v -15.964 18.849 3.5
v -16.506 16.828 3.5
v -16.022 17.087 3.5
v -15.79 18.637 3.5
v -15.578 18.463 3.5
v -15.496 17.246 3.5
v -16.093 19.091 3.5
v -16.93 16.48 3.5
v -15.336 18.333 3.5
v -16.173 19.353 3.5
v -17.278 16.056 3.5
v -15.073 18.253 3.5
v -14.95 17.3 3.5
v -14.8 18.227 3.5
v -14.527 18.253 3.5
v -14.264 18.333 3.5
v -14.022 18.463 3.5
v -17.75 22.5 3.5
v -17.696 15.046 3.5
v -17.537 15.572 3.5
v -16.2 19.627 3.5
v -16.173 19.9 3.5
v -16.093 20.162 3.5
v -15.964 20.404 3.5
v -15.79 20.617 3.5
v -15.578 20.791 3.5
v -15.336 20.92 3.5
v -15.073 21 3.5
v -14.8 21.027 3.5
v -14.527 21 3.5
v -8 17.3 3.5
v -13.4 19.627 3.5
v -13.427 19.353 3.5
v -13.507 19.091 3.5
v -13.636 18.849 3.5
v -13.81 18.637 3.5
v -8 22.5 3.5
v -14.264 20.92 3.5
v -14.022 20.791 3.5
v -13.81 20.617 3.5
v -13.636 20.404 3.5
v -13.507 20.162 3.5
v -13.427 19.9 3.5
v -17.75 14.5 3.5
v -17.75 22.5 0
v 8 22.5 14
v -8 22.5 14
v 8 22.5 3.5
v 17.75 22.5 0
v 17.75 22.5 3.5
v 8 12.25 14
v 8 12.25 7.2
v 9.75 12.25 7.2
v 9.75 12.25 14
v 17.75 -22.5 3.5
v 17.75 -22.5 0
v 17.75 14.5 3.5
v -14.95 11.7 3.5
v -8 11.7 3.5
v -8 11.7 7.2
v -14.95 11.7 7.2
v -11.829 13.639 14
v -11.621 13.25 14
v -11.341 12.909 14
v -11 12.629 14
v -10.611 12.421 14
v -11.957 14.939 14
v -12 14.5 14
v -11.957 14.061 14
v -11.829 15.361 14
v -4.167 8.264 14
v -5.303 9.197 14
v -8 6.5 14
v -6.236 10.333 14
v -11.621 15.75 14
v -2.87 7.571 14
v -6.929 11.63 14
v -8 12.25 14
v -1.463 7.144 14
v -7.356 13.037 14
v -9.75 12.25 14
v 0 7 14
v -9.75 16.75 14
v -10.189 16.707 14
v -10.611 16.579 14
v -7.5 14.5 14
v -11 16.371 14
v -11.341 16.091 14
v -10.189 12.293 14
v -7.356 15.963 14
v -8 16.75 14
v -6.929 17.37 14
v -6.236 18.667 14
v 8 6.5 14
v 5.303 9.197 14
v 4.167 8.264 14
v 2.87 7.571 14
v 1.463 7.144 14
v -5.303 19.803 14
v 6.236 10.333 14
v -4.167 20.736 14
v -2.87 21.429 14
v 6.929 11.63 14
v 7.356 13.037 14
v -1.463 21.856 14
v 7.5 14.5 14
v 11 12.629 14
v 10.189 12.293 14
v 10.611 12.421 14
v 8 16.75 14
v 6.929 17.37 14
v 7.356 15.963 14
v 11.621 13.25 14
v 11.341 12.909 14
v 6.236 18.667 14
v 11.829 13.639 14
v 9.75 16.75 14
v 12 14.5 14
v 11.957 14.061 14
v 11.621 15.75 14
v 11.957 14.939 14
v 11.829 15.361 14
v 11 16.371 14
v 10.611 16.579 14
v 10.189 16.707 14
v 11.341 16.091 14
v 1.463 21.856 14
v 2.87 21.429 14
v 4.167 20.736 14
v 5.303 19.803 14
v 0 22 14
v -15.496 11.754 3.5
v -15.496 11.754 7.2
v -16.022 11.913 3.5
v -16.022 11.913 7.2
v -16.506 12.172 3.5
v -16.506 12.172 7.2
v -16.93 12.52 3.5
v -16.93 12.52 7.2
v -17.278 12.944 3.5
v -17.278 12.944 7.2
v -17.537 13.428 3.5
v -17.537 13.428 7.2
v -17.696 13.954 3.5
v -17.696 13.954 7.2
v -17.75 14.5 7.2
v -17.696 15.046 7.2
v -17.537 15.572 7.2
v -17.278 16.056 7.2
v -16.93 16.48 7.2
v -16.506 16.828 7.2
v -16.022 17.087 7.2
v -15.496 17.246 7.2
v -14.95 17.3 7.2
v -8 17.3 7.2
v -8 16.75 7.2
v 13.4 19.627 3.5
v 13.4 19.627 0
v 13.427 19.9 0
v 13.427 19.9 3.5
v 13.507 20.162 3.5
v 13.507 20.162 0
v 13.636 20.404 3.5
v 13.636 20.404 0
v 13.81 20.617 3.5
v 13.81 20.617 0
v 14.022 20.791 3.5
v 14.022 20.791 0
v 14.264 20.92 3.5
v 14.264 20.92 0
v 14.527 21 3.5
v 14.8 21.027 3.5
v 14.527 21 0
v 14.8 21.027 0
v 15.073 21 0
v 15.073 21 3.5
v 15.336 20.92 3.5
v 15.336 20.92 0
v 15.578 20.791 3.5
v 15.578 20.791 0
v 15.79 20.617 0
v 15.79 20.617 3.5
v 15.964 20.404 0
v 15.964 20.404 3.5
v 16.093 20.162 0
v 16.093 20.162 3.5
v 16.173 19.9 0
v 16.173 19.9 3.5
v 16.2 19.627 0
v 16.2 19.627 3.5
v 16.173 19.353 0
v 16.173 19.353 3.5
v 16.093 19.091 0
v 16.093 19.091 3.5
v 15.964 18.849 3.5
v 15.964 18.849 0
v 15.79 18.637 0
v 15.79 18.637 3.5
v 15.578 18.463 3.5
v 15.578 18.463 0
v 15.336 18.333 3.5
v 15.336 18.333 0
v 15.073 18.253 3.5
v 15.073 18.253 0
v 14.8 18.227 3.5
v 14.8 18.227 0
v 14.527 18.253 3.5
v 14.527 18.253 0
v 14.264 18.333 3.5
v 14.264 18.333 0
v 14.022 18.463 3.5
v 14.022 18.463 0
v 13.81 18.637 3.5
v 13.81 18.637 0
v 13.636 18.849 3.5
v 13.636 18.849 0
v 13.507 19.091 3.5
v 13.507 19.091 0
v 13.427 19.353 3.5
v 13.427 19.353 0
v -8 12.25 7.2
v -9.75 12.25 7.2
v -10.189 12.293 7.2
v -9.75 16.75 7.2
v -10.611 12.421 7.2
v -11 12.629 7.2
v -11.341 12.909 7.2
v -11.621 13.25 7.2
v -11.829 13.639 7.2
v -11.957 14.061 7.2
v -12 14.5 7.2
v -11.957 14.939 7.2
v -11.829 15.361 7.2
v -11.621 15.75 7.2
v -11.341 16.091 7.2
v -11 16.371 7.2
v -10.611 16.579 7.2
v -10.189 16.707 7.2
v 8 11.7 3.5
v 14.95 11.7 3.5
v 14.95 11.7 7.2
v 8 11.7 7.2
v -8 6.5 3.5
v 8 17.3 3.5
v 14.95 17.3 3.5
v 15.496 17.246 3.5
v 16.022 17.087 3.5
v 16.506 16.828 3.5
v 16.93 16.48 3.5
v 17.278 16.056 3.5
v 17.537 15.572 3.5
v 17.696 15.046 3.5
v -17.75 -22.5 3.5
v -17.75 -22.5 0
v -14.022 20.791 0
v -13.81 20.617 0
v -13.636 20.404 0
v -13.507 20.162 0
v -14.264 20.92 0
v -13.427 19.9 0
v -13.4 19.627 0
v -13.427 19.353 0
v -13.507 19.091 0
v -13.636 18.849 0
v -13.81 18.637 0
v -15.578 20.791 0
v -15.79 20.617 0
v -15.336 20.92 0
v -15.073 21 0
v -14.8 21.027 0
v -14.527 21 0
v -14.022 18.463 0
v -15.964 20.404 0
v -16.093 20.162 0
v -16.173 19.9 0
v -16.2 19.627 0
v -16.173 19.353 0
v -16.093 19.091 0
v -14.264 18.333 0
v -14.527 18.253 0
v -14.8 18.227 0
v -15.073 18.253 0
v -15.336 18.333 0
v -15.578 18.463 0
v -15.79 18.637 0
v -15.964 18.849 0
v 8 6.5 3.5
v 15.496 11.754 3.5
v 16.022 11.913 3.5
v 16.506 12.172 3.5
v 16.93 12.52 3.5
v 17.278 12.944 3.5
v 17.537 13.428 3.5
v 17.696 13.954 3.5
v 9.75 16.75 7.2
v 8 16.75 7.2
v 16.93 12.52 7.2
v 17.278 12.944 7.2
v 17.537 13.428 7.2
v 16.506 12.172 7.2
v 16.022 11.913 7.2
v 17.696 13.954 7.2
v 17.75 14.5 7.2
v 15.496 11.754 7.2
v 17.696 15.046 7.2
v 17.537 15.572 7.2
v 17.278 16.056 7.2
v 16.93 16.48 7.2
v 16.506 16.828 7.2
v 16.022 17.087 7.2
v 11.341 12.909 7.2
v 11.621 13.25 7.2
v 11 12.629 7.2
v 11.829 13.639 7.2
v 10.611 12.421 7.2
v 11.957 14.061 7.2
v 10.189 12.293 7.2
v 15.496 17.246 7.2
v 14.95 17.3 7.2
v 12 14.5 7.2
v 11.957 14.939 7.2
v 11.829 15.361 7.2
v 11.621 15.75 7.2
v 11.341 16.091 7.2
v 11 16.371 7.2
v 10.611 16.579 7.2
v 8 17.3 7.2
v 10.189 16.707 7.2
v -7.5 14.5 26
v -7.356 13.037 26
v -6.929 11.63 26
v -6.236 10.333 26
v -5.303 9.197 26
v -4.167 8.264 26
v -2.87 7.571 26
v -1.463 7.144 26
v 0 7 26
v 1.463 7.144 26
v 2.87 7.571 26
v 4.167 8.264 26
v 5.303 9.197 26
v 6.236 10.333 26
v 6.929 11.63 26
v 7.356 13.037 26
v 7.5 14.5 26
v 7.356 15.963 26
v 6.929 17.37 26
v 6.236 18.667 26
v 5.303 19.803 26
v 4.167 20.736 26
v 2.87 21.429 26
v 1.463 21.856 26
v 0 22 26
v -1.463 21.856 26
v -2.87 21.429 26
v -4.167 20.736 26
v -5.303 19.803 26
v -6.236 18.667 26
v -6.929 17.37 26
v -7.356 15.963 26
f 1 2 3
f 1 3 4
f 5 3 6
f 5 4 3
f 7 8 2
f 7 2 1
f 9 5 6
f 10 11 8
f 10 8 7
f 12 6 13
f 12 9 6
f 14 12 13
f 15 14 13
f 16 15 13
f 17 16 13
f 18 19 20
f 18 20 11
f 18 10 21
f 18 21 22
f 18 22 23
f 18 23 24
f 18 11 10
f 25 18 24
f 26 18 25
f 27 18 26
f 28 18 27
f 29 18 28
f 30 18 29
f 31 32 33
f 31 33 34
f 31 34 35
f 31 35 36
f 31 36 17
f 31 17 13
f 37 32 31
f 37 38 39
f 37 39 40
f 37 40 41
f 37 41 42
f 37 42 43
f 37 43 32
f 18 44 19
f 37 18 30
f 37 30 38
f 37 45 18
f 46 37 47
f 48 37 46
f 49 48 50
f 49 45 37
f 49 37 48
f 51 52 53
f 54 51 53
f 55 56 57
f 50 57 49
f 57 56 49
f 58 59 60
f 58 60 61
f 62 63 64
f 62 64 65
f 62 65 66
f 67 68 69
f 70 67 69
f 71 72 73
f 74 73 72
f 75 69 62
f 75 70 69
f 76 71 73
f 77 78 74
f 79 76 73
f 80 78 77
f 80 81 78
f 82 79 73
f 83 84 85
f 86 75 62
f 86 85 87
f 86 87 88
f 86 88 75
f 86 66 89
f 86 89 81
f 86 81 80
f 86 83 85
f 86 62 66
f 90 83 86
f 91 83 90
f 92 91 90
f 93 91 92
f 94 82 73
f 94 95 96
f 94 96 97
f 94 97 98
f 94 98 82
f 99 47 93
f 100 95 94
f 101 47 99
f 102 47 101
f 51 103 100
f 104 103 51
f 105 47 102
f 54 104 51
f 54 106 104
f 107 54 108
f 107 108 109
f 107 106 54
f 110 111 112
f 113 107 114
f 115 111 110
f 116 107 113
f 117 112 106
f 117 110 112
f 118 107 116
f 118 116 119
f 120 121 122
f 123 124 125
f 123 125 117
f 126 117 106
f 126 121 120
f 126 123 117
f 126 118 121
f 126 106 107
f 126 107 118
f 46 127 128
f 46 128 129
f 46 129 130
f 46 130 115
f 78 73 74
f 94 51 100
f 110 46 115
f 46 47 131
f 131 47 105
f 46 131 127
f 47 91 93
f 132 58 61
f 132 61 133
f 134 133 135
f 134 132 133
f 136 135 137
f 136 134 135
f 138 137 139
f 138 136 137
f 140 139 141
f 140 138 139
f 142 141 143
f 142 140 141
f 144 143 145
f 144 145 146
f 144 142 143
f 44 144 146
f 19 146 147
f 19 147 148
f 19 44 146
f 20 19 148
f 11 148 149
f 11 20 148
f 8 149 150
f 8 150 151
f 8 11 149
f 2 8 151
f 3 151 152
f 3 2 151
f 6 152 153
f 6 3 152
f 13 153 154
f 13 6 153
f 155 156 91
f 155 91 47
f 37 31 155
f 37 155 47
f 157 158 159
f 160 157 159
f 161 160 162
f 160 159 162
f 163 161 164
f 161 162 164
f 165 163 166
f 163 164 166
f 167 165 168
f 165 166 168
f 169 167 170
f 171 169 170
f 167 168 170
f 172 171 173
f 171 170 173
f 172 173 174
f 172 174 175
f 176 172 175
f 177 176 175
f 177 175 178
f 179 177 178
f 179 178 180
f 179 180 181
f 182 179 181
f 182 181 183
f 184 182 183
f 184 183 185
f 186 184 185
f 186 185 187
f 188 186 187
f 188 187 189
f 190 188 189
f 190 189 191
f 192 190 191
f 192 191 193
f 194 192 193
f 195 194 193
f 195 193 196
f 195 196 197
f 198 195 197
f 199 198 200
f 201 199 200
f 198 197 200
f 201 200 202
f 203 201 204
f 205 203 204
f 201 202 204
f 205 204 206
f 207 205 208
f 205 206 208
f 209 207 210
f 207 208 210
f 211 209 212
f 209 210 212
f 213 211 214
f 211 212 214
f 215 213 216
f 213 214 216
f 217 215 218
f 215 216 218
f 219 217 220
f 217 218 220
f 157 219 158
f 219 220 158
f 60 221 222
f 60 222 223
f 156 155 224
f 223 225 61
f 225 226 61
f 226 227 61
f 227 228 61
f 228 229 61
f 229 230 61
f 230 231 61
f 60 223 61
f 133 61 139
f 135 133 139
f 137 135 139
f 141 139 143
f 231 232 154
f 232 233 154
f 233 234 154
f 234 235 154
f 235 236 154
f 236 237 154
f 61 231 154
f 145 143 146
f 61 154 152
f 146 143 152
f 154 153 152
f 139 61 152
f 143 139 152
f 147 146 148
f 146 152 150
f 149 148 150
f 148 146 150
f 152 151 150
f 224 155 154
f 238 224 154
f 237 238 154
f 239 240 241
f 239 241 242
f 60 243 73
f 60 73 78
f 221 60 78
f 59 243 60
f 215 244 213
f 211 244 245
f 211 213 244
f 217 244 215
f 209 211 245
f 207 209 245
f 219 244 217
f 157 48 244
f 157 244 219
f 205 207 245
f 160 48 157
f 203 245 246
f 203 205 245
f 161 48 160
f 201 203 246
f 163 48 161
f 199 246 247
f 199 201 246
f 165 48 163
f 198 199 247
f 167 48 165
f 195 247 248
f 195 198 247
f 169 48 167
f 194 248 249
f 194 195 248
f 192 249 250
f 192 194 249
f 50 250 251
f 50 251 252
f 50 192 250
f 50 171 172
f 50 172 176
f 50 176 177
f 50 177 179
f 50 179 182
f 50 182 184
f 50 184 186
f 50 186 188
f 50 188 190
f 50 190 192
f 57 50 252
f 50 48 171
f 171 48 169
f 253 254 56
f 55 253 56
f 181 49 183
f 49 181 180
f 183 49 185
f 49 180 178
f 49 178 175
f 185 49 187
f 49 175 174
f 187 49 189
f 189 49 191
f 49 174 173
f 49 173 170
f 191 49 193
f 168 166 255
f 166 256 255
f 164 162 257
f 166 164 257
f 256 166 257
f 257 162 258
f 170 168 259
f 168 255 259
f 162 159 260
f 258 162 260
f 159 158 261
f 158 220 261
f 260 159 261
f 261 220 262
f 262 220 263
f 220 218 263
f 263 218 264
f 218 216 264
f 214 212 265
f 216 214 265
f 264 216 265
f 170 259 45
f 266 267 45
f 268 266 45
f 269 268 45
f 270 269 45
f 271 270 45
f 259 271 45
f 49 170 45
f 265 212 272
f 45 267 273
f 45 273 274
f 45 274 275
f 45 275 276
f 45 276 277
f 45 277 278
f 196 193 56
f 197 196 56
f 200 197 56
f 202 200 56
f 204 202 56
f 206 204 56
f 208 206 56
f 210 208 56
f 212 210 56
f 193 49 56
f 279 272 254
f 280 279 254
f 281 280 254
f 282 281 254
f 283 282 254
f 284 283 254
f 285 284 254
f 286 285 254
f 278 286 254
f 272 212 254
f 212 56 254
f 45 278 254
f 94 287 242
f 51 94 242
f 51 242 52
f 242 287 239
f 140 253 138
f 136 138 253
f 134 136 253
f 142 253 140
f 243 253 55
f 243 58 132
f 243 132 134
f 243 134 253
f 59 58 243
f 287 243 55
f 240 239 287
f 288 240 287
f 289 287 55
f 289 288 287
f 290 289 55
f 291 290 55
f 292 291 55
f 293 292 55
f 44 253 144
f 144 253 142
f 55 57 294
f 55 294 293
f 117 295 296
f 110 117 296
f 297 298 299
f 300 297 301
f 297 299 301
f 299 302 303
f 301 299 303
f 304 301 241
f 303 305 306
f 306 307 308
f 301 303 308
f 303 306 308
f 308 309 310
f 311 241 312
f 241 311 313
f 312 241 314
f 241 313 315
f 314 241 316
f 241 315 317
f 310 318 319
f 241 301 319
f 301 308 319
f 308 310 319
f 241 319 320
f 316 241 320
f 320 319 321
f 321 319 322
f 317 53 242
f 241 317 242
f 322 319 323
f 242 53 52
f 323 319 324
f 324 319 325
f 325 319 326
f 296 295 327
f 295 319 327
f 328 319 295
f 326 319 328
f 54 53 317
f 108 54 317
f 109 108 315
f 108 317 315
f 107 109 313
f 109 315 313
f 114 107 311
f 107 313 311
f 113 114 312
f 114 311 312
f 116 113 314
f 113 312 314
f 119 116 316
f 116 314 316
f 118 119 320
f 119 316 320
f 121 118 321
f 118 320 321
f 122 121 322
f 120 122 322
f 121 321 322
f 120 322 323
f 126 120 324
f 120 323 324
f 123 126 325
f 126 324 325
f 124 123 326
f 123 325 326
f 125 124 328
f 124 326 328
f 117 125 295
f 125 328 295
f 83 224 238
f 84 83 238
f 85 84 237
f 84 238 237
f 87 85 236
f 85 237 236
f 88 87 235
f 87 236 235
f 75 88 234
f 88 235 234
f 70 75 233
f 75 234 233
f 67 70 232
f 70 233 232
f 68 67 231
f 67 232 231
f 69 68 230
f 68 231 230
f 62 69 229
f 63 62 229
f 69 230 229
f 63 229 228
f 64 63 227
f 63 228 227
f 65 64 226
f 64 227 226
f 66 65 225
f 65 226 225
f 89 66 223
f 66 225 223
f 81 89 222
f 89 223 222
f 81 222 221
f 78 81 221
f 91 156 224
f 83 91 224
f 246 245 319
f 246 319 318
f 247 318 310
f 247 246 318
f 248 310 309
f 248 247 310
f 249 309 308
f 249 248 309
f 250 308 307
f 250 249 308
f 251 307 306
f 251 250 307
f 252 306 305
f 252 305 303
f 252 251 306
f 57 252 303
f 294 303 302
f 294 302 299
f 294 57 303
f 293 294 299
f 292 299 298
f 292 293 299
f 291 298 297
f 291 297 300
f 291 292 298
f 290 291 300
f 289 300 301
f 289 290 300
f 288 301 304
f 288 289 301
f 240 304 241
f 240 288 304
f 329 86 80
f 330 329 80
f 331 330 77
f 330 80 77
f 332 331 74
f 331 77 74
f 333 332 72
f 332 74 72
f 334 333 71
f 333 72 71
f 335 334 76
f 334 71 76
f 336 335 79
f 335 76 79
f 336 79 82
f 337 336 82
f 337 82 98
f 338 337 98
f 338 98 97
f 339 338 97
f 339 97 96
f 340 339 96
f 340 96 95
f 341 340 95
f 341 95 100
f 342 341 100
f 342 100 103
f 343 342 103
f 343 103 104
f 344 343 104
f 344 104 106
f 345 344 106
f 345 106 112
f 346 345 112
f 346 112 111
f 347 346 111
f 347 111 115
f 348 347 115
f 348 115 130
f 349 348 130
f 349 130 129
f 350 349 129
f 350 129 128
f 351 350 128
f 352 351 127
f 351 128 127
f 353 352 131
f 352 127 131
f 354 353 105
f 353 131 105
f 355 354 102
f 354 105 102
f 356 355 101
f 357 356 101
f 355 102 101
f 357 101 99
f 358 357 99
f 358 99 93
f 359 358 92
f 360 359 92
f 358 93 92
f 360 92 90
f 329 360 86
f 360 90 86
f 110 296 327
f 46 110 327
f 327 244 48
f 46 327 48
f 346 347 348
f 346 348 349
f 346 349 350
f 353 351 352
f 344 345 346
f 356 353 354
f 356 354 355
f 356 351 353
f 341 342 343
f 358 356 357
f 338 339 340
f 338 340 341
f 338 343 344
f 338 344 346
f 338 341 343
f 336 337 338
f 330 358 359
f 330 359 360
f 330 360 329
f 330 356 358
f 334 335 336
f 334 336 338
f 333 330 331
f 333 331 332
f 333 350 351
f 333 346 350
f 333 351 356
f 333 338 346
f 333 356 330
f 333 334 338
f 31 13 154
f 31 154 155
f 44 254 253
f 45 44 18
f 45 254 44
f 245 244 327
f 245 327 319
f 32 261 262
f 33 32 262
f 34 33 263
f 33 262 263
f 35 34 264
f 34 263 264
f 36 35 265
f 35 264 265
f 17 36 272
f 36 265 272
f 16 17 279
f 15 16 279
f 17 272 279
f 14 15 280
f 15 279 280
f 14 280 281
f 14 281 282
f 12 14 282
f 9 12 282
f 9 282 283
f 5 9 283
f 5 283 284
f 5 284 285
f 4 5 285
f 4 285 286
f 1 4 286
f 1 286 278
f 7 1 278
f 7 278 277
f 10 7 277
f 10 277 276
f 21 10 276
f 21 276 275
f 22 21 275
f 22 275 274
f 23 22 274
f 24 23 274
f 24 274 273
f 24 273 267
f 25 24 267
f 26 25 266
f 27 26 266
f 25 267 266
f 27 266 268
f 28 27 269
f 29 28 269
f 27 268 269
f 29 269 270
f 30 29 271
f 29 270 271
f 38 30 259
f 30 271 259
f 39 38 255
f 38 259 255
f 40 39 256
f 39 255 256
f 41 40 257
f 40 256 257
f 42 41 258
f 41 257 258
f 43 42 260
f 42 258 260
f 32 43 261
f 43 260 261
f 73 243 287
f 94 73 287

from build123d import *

# Parameters (mm, degrees)
SKETCH_4_W          = 35.5
SKETCH_4_H          = 45
EXTRUDE_2_DEPTH     = 3.5
EXTRUDE_START       = -3.5
SKETCH_5_W          = 16
SKETCH_5_H          = 4.5
SKETCH_5_H_2        = 5.75
EXTRUDE_3_DEPTH     = 14
EXTRUDE_4_DEPTH     = 7.2
EXTRUDE_START_2     = -14
SKETCH_7_R          = 7.5
EXTRUDE_5_DEPTH     = 26
CUT_EXTRUDE_1_REACH = 40.695
SKETCH_8_R          = 1.4


with BuildPart() as part:
    # 草图4 → 凸台-拉伸2 (new body)
    with BuildSketch(Plane.XY):
        Rectangle(SKETCH_4_W, SKETCH_4_H)
    extrude(amount=EXTRUDE_2_DEPTH)

    # 草图5 → 凸台-拉伸3 (add)
    with BuildSketch(Plane.XY.offset(3.5).offset(EXTRUDE_START)):
        with BuildLine():
            Line((-8, 12.25), (-8, 16.75))
            Line((-8, 16.75), (-9.75, 16.75))
            ThreePointArc((-9.75, 16.75), (-12, 14.5), (-9.75, 12.25))
            Line((-9.75, 12.25), (-8, 12.25))
        make_face()
        with Locations((0, 14.5)):
            Rectangle(SKETCH_5_W, SKETCH_5_H)
        with Locations((0, 19.625)):
            Rectangle(SKETCH_5_W, SKETCH_5_H_2)
        with BuildLine():
            Line((9.75, 16.75), (8, 16.75))
            Line((8, 16.75), (8, 12.25))
            Line((8, 12.25), (9.75, 12.25))
            ThreePointArc((9.75, 12.25), (12, 14.5), (9.75, 16.75))
        make_face()
        with Locations((0, 9.375)):
            Rectangle(SKETCH_5_W, SKETCH_5_H_2)
    extrude(amount=EXTRUDE_3_DEPTH)

    # 草图6 → 凸台-拉伸4 (add)
    with BuildSketch(Plane.XY.offset(3.5).offset(EXTRUDE_START)):
        with BuildLine():
            Line((-14.95, 17.3), (14.95, 17.3))
            ThreePointArc((14.95, 17.3), (17.75, 14.5), (14.95, 11.7))
            Line((14.95, 11.7), (-14.95, 11.7))
            ThreePointArc((-14.95, 11.7), (-17.75, 14.5), (-14.95, 17.3))
        make_face()
    extrude(amount=EXTRUDE_4_DEPTH)

    # 草图7 → 凸台-拉伸5 (add)
    with BuildSketch(Plane.XY.offset(14).offset(EXTRUDE_START_2)):
        with Locations(Location((0, 14.5, 0), (0, 0, 180))):
            Circle(SKETCH_7_R)
    extrude(amount=EXTRUDE_5_DEPTH)

    # 草图8 → 切除-拉伸1 (cut, up to next)
    with BuildSketch(Plane(origin=(0, 0, 0), x_dir=(-1, 0, 0), z_dir=(0, 0, -1)), mode=Mode.PRIVATE) as cut_extrude_1_sk1:
        with Locations((-14.8, 19.626575336)):
            Circle(SKETCH_8_R)
    cut_extrude_1_tool1 = extrude(cut_extrude_1_sk1.sketch, amount=-CUT_EXTRUDE_1_REACH, mode=Mode.PRIVATE) & part.part
    # 草图8 → 切除-拉伸1 (cut, up to next)
    with BuildSketch(Plane(origin=(0, 0, 0), x_dir=(-1, 0, 0), z_dir=(0, 0, -1)), mode=Mode.PRIVATE) as cut_extrude_1_sk2:
        with Locations(Location((14.8, 19.626575336, 0), (0, 0, 180))):
            Circle(SKETCH_8_R)
    cut_extrude_1_tool2 = extrude(cut_extrude_1_sk2.sketch, amount=-CUT_EXTRUDE_1_REACH, mode=Mode.PRIVATE) & part.part
    add(cut_extrude_1_tool1.solids().sort_by_distance((14.8, 19.626575, 0))[0], mode=Mode.SUBTRACT)
    add(cut_extrude_1_tool2.solids().sort_by_distance((-14.8, 19.626575, 0))[0], mode=Mode.SUBTRACT)


solid = part.part
